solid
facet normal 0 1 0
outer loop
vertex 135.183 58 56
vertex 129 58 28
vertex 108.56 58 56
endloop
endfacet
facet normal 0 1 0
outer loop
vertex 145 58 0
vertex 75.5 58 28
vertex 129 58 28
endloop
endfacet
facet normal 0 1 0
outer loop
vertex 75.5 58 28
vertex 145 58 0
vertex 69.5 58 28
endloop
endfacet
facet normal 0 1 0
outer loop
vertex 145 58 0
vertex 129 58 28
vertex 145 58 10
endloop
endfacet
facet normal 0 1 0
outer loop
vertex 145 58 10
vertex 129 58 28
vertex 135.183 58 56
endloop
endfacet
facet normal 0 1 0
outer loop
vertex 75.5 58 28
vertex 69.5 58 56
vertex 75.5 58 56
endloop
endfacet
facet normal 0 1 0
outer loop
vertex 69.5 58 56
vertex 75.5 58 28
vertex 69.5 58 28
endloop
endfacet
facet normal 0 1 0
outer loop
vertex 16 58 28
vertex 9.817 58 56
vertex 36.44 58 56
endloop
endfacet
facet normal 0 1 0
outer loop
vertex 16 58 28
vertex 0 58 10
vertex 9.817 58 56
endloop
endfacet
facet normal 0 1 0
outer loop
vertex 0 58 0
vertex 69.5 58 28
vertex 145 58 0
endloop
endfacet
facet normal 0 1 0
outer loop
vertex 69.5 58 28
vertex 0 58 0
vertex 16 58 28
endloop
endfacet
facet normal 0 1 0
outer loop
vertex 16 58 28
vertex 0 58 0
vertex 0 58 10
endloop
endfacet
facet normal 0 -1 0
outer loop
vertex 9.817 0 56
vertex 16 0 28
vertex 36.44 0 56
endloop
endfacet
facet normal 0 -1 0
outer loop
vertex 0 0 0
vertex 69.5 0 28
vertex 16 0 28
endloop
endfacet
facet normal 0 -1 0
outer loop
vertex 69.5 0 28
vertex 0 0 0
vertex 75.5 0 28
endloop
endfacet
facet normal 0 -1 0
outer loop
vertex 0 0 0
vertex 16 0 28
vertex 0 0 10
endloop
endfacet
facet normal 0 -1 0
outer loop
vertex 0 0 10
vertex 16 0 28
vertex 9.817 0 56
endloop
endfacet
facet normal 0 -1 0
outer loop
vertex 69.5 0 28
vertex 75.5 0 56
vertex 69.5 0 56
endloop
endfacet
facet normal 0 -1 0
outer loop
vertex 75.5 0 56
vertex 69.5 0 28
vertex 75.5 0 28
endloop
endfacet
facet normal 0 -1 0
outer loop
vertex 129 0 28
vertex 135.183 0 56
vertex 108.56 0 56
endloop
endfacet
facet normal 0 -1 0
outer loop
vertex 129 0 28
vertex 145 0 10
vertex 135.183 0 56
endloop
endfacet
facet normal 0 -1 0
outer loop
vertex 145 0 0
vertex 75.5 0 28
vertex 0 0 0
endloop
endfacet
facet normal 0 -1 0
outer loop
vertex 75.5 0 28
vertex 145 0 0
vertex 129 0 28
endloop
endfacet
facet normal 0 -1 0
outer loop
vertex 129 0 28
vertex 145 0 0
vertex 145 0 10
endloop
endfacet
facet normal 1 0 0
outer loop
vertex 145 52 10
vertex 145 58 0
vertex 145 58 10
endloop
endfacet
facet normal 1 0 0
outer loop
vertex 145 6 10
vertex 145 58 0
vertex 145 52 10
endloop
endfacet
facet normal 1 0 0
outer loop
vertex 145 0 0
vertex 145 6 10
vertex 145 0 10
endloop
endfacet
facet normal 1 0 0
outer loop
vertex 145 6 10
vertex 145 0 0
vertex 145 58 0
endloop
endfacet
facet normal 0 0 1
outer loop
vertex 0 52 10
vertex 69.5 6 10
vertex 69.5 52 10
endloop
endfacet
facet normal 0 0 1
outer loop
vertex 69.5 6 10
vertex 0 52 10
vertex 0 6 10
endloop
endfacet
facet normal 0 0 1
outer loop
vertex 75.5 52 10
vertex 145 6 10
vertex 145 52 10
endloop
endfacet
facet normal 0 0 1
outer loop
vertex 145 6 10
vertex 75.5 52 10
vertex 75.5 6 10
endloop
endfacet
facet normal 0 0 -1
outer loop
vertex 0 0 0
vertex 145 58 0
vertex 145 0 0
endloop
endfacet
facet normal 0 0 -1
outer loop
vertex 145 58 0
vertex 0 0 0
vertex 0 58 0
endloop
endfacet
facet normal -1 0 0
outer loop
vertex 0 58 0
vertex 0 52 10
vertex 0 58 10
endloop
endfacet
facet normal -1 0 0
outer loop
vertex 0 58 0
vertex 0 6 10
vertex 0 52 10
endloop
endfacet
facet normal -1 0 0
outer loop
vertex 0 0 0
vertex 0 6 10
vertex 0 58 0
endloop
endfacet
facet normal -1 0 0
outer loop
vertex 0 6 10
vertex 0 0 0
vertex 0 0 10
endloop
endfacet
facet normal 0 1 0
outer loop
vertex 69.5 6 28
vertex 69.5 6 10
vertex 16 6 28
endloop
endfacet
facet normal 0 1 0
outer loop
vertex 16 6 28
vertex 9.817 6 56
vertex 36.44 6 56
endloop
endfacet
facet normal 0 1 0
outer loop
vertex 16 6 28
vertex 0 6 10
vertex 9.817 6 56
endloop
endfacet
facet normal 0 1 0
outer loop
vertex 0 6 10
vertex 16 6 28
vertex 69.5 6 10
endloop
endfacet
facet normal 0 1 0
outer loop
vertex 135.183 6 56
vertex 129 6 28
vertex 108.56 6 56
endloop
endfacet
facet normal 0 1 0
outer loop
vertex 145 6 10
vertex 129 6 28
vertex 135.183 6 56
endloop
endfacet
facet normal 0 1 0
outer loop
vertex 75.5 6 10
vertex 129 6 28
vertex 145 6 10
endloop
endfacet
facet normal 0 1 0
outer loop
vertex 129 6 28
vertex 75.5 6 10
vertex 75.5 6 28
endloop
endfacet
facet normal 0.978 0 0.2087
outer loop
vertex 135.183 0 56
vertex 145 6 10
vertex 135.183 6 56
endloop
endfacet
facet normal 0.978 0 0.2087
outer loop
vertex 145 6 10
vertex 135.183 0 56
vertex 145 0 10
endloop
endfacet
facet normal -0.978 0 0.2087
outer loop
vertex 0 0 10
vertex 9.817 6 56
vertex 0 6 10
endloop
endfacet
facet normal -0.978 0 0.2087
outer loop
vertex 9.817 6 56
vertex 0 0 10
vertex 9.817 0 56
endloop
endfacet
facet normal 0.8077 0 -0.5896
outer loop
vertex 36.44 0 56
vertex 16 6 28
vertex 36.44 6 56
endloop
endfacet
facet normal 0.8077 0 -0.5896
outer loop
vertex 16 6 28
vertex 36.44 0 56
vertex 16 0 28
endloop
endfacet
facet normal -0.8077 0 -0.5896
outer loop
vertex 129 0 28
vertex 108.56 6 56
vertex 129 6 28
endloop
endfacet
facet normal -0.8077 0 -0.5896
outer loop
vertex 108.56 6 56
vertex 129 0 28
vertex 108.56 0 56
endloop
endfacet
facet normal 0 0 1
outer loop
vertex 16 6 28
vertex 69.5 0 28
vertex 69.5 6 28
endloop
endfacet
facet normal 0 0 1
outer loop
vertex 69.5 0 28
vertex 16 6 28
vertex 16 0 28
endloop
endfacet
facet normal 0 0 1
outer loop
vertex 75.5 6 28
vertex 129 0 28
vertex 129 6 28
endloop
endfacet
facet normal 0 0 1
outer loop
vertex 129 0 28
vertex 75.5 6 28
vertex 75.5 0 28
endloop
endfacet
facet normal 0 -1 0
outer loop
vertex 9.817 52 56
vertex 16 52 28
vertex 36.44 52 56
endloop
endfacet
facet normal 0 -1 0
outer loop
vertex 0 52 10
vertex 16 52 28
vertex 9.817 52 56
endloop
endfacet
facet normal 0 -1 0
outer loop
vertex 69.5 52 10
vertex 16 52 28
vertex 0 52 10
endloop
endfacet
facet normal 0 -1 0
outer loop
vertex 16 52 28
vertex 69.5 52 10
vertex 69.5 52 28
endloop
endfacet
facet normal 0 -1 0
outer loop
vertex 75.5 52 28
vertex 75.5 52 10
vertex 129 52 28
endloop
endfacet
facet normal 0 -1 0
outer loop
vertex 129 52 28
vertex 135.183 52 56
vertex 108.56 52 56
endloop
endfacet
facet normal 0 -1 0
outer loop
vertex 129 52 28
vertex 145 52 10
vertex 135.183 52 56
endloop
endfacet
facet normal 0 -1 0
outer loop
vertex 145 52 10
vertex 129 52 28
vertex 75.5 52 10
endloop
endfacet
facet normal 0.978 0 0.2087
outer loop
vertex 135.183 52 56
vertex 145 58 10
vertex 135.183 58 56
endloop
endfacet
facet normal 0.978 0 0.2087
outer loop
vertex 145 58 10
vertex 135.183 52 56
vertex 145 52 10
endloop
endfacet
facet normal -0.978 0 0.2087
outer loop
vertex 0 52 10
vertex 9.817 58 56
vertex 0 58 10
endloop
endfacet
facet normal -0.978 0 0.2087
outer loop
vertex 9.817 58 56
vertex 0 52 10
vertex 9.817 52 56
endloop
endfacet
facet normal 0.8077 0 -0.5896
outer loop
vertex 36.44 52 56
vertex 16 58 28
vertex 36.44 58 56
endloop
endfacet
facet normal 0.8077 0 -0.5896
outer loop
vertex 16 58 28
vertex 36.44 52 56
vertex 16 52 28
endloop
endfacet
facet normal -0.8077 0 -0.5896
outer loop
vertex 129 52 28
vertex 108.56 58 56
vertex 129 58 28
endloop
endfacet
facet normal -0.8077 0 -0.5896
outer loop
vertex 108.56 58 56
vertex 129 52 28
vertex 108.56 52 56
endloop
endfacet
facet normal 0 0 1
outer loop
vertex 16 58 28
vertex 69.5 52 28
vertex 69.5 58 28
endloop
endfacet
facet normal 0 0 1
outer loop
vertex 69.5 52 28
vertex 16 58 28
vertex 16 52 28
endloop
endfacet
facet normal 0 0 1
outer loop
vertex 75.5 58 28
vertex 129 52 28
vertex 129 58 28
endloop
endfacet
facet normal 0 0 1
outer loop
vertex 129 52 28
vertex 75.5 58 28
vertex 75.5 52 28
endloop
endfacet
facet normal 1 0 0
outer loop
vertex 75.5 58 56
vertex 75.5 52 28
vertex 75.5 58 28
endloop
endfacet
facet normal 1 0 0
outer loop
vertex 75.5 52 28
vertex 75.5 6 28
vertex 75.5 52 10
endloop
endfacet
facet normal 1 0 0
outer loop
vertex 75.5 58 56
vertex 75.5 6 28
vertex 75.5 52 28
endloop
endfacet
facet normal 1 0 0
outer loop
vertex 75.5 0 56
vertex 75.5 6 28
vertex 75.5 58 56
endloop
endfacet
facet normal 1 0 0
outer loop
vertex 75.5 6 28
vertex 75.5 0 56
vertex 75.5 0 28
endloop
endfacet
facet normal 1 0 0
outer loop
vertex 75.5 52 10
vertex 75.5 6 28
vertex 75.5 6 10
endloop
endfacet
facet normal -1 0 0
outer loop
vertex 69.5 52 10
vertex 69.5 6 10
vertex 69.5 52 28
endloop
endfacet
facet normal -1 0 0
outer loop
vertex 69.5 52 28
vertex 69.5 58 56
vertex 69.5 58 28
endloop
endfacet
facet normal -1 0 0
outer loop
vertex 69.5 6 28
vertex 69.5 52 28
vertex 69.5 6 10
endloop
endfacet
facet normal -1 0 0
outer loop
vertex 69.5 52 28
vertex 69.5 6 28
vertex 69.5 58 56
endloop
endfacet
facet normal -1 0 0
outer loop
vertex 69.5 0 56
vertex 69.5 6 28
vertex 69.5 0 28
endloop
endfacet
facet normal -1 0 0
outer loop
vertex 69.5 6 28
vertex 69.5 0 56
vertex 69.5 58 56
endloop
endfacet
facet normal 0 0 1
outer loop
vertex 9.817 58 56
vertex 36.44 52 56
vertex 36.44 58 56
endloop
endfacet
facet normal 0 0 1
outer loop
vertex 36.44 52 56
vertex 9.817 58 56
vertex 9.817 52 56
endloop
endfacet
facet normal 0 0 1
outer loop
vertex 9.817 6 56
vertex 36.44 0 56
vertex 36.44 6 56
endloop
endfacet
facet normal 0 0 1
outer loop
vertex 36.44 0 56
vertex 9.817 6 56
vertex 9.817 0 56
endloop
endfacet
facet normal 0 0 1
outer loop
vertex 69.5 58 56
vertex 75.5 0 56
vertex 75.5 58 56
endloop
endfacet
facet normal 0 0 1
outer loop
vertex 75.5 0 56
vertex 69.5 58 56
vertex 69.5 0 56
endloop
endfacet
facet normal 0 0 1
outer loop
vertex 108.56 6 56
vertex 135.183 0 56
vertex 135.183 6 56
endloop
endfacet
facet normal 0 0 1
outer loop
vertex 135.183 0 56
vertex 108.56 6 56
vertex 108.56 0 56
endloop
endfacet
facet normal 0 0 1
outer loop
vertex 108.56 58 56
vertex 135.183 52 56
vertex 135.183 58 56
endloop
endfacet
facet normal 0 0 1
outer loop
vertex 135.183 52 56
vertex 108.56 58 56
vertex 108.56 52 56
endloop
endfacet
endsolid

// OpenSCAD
board_length = 1200;
board_depth = 200;
board_thickness = 18;
top_of_board_height = 120;

support_height = top_of_board_height - board_thickness;

holder_depth = 145;
holder_width = 58;
base_thickness = 10;
side_wall_thickness = 6;
top_platform_depth = 110;
top_platform_thickness = 10;
retainer_height = 4;
retainer_thickness = 4;
center_rib_thickness = 6;
union_overlap = 0.4;

cutout_margin = 16;
cutout_bottom = 18;
cutout_top_offset = 14;

split_z = 56;
joint_overlap_height = 12;
joint_block_x = 16;
joint_block_y = 18;
joint_clearance = 0.35;

add_screw_holes = true;
screw_hole_diameter = 4.5;
screw_head_diameter = 8;
screw_head_height = 2.5;
screw_length = top_platform_thickness + board_thickness - 2;

render_part = "base";  // "base", "cap", "holder"
show_preview = false;
show_full_table = true;
show_preview_screws = true;
explode_parts = false;
explode_distance = 25;

$fn = 48;

top_platform_x = (holder_depth - top_platform_depth) / 2;
holder_total_height = support_height + retainer_height;
joint_x_positions = [holder_depth / 2 - 22, holder_depth / 2 + 22];

echo("Holder print size (mm):", [holder_depth, holder_width, holder_total_height]);
echo("Shelf underside height (mm):", support_height);
echo("Split part heights (mm):", [split_z, holder_total_height - split_z + joint_overlap_height]);

module side_profile() {
    difference() {
        polygon(points = [
            [0, 0],
            [holder_depth, 0],
            [holder_depth, base_thickness],
            [top_platform_x + top_platform_depth, support_height - top_platform_thickness],
            [top_platform_x + top_platform_depth, support_height],
            [top_platform_x, support_height],
            [top_platform_x, support_height - top_platform_thickness],
            [0, base_thickness]
        ]);

        polygon(points = [
            [cutout_margin, base_thickness + cutout_bottom],
            [holder_depth - cutout_margin, base_thickness + cutout_bottom],
            [holder_depth / 2 + 20, support_height - top_platform_thickness - cutout_top_offset],
            [holder_depth / 2 - 20, support_height - top_platform_thickness - cutout_top_offset]
        ]);
    }
}

module support_shell() {
    union() {
        cube([holder_depth, holder_width, base_thickness]);

        translate([0, side_wall_thickness, 0])
            rotate([90, 0, 0])
                linear_extrude(height = side_wall_thickness)
                    side_profile();

        translate([0, holder_width, 0])
            rotate([90, 0, 0])
                linear_extrude(height = side_wall_thickness)
                    side_profile();

        translate([top_platform_x, 0, support_height - top_platform_thickness - union_overlap])
            difference() {
                cube([
                    top_platform_depth,
                    holder_width,
                    top_platform_thickness + retainer_height + union_overlap
                ]);

                translate([retainer_thickness, -0.1, top_platform_thickness + union_overlap])
                    cube([
                        top_platform_depth - (retainer_thickness * 2),
                        holder_width + 0.2,
                        retainer_height + 1
                    ]);
            }

        translate([(holder_depth - center_rib_thickness) / 2, 0, base_thickness - union_overlap])
            cube([
                center_rib_thickness,
                holder_width,
                support_height - top_platform_thickness - base_thickness + (union_overlap * 2)
            ]);
    }
}

module shelf_screw_holes() {
    for (x_pos = joint_x_positions) {
        translate([x_pos, holder_width / 2, support_height - top_platform_thickness - 1])
            cylinder(h = top_platform_thickness + retainer_height + 2, d = screw_hole_diameter);
    }
}

module holder_body() {
    if (add_screw_holes) {
        difference() {
            support_shell();
            shelf_screw_holes();
        }
    } else {
        support_shell();
    }
}

module lower_mask() {
    translate([-1, -1, -1])
        cube([holder_depth + 2, holder_width + 2, split_z + 1]);
}

module upper_mask() {
    translate([-1, -1, split_z])
        cube([holder_depth + 2, holder_width + 2, holder_total_height - split_z + 2]);
}

module joint_block(x_pos, clearance = 0) {
    translate([
        x_pos - (joint_block_x / 2) - clearance,
        (holder_width - joint_block_y) / 2 - clearance,
        split_z - joint_overlap_height - clearance
    ])
        cube([
            joint_block_x + (clearance * 2),
            joint_block_y + (clearance * 2),
            joint_overlap_height + clearance
        ]);
}

module base_joint_pockets() {
    for (x_pos = joint_x_positions) {
        joint_block(x_pos, joint_clearance);
    }
}

module base_joint_holes() {
    children();
}

module cap_joint_blocks() {
    for (x_pos = joint_x_positions) {
        joint_block(x_pos);
    }
}

module cap_joint_thread_holes() {
    children();
}

module base_part_actual() {
    difference() {
        intersection() {
            holder_body();
            lower_mask();
        }

        base_joint_pockets();
    }
}

module cap_part_actual() {
    difference() {
        union() {
            intersection() {
                holder_body();
                upper_mask();
            }

            cap_joint_blocks();
        }
    }
}

module base_part_print() {
    base_part_actual();
}

module cap_part_print() {
    translate([0, 0, -(split_z - joint_overlap_height)])
        cap_part_actual();
}

module screw_visual(length, shaft_diameter, head_diameter, head_height) {
    color([0.75, 0.77, 0.8]) {
        cylinder(h = length, d = shaft_diameter);

        translate([0, 0, length])
            cylinder(h = head_height, d1 = head_diameter, d2 = shaft_diameter + 0.5);
    }
}

module preview_board_screws(y_offset = 0) {
    for (x_pos = joint_x_positions) {
        translate([x_pos, y_offset + holder_width / 2, support_height - top_platform_thickness])
            screw_visual(screw_length, screw_hole_diameter - 0.6, screw_head_diameter, screw_head_height);
    }
}

module preview_joint_screws(y_offset = 0) {
    children();
}

module assembled_holder(y_offset = 0) {
    color([0.2, 0.25, 0.3])
        translate([0, y_offset, 0])
            base_part_actual();

    color([0.25, 0.3, 0.35])
        translate([0, y_offset, explode_parts ? explode_distance : 0])
            cap_part_actual();

    if (show_preview_screws) {
        preview_board_screws(y_offset);
    }

}

module preview() {
    color([0.85, 0.85, 0.9])
        translate([0, 0, support_height])
            cube([
                board_depth,
                show_full_table ? board_length : holder_width,
                board_thickness
            ]);

    assembled_holder();

    if (show_full_table) {
        assembled_holder(board_length - holder_width);
    }
}

module full_holder_print() {
    holder_body();
}

if (show_preview) {
    preview();
} else if (render_part == "cap") {
    cap_part_print();
} else if (render_part == "holder") {
    full_holder_print();
} else {
    base_part_print();
}
